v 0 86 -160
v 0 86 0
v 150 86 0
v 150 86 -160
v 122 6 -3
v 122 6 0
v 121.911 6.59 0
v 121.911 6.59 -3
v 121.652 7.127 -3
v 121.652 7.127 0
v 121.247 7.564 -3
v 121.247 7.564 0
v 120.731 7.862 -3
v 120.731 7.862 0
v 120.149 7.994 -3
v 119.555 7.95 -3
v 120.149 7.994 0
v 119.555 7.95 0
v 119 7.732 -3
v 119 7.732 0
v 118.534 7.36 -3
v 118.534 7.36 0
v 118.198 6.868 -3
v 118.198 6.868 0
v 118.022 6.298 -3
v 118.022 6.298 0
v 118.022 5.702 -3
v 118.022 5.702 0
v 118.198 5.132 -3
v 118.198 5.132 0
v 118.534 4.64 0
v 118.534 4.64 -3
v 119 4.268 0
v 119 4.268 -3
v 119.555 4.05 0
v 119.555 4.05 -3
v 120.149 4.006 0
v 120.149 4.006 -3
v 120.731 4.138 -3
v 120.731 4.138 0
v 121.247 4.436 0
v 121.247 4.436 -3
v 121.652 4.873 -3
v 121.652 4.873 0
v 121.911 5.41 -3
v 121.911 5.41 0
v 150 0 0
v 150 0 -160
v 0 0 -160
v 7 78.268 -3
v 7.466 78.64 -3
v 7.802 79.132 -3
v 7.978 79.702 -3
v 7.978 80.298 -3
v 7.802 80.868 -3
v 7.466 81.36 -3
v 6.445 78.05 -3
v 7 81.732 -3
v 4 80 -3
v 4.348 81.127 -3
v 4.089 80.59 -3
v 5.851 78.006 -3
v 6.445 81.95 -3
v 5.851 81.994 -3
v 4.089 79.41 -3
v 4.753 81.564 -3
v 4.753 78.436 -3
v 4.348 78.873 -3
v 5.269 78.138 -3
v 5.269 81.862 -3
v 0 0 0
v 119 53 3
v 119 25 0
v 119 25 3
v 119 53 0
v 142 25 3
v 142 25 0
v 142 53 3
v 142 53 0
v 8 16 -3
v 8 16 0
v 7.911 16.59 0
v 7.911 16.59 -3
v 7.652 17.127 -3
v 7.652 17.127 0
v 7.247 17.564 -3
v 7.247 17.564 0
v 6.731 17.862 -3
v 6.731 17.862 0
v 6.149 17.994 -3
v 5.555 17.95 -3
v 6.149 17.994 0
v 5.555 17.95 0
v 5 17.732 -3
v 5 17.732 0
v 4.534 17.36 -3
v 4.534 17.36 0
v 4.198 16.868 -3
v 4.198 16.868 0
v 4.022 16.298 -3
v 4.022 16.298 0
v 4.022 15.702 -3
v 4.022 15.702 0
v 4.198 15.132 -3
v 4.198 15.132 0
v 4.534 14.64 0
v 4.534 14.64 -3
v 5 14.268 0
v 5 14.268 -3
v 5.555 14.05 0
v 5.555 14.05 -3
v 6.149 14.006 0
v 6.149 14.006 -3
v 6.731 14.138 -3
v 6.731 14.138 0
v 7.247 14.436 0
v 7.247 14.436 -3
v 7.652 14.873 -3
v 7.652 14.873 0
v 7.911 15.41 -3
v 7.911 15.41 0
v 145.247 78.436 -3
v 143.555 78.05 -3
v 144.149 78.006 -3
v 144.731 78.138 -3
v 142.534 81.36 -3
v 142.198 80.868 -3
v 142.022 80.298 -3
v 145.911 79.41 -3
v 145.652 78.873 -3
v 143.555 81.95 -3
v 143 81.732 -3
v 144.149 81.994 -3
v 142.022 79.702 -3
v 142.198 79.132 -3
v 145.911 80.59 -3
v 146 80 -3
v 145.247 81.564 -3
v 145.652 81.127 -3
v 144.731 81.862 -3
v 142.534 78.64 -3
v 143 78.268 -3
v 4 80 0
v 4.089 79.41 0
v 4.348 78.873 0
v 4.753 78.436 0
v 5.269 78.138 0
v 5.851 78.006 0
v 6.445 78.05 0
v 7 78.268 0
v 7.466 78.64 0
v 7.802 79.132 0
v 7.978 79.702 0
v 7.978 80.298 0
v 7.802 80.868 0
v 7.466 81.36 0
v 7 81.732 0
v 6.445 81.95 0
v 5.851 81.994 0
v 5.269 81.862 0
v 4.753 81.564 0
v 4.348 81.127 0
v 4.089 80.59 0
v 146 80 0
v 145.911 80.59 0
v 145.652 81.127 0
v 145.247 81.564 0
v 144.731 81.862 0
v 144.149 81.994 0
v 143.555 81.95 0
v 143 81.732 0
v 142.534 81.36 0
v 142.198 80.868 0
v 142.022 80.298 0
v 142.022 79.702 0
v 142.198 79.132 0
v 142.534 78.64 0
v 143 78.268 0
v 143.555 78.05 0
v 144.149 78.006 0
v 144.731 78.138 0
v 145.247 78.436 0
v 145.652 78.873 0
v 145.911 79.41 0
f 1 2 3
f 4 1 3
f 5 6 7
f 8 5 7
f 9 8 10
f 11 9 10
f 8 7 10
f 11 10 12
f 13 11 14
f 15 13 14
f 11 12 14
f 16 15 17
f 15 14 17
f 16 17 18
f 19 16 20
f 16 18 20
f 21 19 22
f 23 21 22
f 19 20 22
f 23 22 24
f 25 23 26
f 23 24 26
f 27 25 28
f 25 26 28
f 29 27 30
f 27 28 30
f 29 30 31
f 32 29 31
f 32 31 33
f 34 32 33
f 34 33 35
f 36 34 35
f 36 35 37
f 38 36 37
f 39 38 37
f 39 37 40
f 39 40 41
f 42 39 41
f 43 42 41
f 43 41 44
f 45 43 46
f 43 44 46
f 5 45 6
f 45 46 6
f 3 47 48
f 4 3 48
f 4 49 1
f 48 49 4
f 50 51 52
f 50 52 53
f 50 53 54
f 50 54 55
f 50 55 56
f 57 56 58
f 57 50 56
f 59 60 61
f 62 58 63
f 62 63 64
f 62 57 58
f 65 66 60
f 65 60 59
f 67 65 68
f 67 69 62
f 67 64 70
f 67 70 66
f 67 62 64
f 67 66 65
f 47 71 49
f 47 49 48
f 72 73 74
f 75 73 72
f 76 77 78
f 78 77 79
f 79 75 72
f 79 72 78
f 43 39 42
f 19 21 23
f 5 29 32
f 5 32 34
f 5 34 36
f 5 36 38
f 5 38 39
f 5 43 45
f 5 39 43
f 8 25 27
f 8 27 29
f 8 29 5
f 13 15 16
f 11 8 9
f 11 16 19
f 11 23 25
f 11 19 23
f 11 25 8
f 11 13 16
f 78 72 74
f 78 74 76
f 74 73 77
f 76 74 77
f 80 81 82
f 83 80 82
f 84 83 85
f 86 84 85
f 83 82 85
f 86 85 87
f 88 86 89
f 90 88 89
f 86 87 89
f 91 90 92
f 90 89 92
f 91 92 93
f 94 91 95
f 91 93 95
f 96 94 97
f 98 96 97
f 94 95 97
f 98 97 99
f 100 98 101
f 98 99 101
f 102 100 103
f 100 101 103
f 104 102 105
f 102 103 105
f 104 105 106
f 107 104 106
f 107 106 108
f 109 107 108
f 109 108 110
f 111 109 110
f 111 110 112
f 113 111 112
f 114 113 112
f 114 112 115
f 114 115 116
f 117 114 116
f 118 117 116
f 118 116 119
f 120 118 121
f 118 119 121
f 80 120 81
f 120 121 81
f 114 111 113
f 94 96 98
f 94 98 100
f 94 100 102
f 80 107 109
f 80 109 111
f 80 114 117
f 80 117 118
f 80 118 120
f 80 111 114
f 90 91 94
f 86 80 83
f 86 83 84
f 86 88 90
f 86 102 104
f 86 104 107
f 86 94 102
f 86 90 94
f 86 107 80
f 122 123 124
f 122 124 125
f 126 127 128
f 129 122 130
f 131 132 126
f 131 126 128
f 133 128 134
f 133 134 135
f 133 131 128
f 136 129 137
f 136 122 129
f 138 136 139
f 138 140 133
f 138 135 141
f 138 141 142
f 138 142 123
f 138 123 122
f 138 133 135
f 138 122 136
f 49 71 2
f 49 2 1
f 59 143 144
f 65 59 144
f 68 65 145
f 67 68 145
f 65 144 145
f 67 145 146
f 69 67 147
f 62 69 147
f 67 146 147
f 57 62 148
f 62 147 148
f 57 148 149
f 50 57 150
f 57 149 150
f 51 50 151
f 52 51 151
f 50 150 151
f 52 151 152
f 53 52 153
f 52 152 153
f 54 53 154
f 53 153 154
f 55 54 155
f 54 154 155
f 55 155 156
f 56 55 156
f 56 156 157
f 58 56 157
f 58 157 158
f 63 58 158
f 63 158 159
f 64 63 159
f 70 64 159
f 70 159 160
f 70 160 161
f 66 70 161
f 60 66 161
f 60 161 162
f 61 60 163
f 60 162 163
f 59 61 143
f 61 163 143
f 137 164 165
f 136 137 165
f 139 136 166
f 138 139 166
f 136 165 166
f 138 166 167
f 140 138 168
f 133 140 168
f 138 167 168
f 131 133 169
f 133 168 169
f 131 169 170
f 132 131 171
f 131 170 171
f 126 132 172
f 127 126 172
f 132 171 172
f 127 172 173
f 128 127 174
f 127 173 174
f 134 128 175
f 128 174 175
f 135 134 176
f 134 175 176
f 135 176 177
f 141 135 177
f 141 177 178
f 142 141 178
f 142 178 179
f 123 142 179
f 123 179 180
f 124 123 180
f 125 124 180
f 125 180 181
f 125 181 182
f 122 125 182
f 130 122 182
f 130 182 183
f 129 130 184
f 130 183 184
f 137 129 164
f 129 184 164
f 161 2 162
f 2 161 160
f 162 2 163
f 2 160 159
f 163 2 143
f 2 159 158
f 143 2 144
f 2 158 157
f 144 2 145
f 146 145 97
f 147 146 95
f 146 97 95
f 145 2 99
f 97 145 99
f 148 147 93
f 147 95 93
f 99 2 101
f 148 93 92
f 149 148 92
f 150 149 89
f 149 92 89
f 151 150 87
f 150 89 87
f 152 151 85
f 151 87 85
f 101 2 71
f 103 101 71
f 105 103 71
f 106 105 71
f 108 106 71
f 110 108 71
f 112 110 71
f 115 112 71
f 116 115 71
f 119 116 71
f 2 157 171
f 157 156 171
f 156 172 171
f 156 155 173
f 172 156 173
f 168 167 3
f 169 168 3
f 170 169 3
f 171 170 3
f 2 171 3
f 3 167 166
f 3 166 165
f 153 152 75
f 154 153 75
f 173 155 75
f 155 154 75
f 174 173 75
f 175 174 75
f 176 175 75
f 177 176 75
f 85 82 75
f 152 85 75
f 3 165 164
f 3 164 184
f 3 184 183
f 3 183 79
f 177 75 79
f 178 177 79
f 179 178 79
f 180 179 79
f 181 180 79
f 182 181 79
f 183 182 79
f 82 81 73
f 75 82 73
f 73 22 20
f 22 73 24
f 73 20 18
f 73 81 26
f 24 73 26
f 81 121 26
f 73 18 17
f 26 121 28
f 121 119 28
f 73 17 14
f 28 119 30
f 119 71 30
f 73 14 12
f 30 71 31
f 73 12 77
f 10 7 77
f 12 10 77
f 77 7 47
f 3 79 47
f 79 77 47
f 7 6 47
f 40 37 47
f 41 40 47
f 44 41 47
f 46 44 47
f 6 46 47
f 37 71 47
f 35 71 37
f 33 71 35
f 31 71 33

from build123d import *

# Parameters (mm, degrees)
SKETCH1_W           = 150
SKETCH1_H           = 160
BOSS_EXTRUDE1_DEPTH = 86
SKETCH6_W           = 23
SKETCH6_H           = 28
BOSS_EXTRUDE2_DEPTH = 3
SKETCH7_R           = 2
CUT_EXTRUDE1_DEPTH  = 3


with BuildPart() as part:
    # Sketch1 → Boss-Extrude1 (new body)
    with BuildSketch(Plane(origin=(0, 0, 0), x_dir=(1, 0, 0), z_dir=(0, 1, 0))):
        with Locations((75, 80)):
            Rectangle(SKETCH1_W, SKETCH1_H)
    extrude(amount=BOSS_EXTRUDE1_DEPTH)

    # Sketch6 → Boss-Extrude2 (add)
    with BuildSketch(Plane.XY):
        with Locations((130.5, 39)):
            Rectangle(SKETCH6_W, SKETCH6_H)
    extrude(amount=BOSS_EXTRUDE2_DEPTH)

    # Sketch7 → Cut-Extrude1 (cut)
    with BuildSketch(Plane.XY):
        with Locations((144, 80)):
            Circle(SKETCH7_R)
        with Locations(Location((6, 80, 0), (0, 0, 180))):
            Circle(SKETCH7_R)
        with Locations((6, 16)):
            Circle(SKETCH7_R)
        with Locations((120, 6)):
            Circle(SKETCH7_R)
    extrude(amount=-CUT_EXTRUDE1_DEPTH, mode=Mode.SUBTRACT)


solid = part.part
